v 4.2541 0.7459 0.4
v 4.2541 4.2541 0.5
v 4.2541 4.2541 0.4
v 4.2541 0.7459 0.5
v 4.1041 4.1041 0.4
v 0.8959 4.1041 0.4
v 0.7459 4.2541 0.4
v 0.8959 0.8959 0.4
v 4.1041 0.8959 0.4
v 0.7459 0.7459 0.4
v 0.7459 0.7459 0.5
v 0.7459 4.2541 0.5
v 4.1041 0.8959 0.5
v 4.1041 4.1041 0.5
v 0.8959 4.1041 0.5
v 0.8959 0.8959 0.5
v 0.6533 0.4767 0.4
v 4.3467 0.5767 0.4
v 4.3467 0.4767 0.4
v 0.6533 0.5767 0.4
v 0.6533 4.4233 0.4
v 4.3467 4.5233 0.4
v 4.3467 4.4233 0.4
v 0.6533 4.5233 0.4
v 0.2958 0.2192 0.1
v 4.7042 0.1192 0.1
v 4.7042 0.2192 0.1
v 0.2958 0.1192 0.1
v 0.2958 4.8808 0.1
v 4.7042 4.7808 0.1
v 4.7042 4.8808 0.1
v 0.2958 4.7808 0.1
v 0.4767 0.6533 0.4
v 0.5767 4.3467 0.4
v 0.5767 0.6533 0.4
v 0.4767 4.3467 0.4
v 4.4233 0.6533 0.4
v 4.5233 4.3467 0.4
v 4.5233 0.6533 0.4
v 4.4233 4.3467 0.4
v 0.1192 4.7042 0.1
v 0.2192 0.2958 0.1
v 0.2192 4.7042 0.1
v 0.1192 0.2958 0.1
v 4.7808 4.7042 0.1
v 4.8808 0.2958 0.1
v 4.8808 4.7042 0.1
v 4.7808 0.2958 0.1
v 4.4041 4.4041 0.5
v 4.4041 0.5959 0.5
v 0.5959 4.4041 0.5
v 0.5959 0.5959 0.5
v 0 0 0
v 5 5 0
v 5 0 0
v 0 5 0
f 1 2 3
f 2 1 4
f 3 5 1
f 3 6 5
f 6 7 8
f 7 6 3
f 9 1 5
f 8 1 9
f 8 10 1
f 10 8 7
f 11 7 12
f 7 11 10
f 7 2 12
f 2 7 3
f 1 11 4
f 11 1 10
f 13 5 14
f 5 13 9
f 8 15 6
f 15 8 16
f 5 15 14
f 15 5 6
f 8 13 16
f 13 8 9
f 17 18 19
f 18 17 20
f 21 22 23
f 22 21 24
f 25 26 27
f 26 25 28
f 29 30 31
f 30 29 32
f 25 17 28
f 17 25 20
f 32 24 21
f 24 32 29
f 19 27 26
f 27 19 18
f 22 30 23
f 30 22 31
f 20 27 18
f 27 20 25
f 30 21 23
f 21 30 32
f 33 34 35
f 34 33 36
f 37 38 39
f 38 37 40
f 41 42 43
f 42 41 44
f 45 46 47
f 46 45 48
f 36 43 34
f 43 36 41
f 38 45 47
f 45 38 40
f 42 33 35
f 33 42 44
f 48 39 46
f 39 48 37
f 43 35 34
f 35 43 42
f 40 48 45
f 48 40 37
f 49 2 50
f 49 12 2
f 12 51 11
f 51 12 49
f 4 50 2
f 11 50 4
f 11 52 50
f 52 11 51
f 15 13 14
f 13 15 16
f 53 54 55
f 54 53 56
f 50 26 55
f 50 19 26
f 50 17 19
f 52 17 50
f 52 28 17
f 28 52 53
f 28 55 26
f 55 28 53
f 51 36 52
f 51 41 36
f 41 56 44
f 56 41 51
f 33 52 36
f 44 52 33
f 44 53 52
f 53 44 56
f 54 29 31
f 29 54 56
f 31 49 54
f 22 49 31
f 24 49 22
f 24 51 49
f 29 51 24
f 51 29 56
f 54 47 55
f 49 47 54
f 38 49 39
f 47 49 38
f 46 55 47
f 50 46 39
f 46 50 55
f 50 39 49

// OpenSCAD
lenght = 5; 
width = 5;
height = 0.5;

//The angle of the side
degree = 50; // [1:89]

//The depth of the top cutout
depth = .1;
//The margin between the platform and the top cutout
margin = .15;
//The width of the top cutout
innerWidth = .15;
//The width of the side sticks
marginSide = .1;
//The depth of the side cutout
depthSide = .1;

/* [Hidden] */

offset = tan(degree)*height;


difference() {
   cube([lenght,width,height]);

rotate([-degree,0,0]) {
translate([-1,-1*height*width,0]) {
    
       cube([lenght+2,height*width,height*10]); 
    } 
}

rotate([0,degree,0]) {
translate([-1*lenght*height,-1,0]) {
    
       cube([lenght*height,width+2,height*10]); 
    } 
}

translate([0,width,0]){
    rotate([degree,0,0]) {
    translate([-1,0,0]) {
        
           cube([lenght+2,height*width,height*10]); 
        } 
    }
}

translate([lenght,0,0]) {
    rotate([0,-degree,0]) {
    translate([0,-1,0]) {
        
           cube([lenght*height,width+2,height*10]); 
        } 
    }
}

difference() {
translate([offset+margin,offset+margin,height-depth]) {
cube([lenght - 2*offset - margin*2, width-2*offset - margin*2, height]);
}

translate([offset+margin+innerWidth,offset+margin+innerWidth,height-depth-1]) {
cube([lenght - 2*offset - margin*2-2*innerWidth, width-2*offset - margin*2-2*innerWidth, height+2]);
}


}

//FRONT
intersection() {
difference() {
translate([0,0,marginSide]) {
cube([lenght, width, height-2*marginSide]); 
}
translate([marginSide+marginSide*sin(degree),0,0]) {
rotate([0,degree,0]) {
translate([-1*lenght*height,-1,0]) {
    
       cube([lenght*height,width+2,height*10]); 
    } 
}
}
translate([-1*(marginSide+marginSide*sin(degree)),0,0]) {
translate([lenght,0,0]) {
    rotate([0,-degree,0]) {
    translate([0,-1,0]) {
        
           cube([lenght*height,width+2,height*10]); 
        } 
    }
}
}
}

translate([0,depthSide,0]) {
rotate([-degree,0,0]) {
translate([-1,-1*height*width,0]) {
    
       cube([lenght+2,height*width,height*10]); 
    } 
}
}
}


//BACK
intersection() {
    difference() {
translate([0,0,marginSide]) {
cube([lenght, width, height-2*marginSide]); 
}
translate([marginSide+marginSide*sin(degree),0,0]) {
rotate([0,degree,0]) {
translate([-1*lenght*height,-1,0]) {
    
       cube([lenght*height,width+2,height*10]); 
    } 
}
}
translate([-1*(marginSide+marginSide*sin(degree)),0,0]) {
translate([lenght,0,0]) {
    rotate([0,-degree,0]) {
    translate([0,-1,0]) {
        
           cube([lenght*height,width+2,height*10]); 
        } 
    }
}
}
}
translate([0,-depthSide,0]) {
translate([0,width,0]){
    rotate([degree,0,0]) {
    translate([-1,0,0]) {
        
           cube([lenght+2,height*width,height*10]); 
        } 
    }
}
}

}



//LEFT
intersection() {
difference() {
translate([0,0,marginSide]) {
cube([lenght, width, height-2*marginSide]); 
}

translate([0,-1*(marginSide+marginSide*sin(degree)),0]) {
translate([0,width,0]){
    rotate([degree,0,0]) {
    translate([-1,0,0]) {
        
           cube([lenght+2,height*width,height*10]); 
        } 
    }
}
}
translate([0,marginSide+marginSide*sin(degree),0]) {
rotate([-degree,0,0]) {
translate([-1,-1*height*width,0]) {
    
       cube([lenght+2,height*width,height*10]); 
    } 
}
}
}
translate([depthSide,0,0]) {
rotate([0,degree,0]) {
translate([-1*lenght*height,-1,0]) {
    
       cube([lenght*height,width+2,height*10]); 
    } 
}
}
}
//RIGHT
intersection() {
difference() {
translate([0,0,marginSide]) {
cube([lenght, width, height-2*marginSide]); 
}

translate([0,-1*(marginSide+marginSide*sin(degree)),0]) {
translate([0,width,0]){
    rotate([degree,0,0]) {
    translate([-1,0,0]) {
        
           cube([lenght+2,height*width,height*10]); 
        } 
    }
}
}
translate([0,marginSide+marginSide*sin(degree),0]) {
rotate([-degree,0,0]) {
translate([-1,-1*height*width,0]) {
    
       cube([lenght+2,height*width,height*10]); 
    } 
}
}
}
translate([lenght-depthSide,0,0]) {
    rotate([0,-degree,0]) {
    translate([0,-1,0]) {
        
           cube([lenght*height,width+2,height*10]); 
        } 
    }
}
}
}
